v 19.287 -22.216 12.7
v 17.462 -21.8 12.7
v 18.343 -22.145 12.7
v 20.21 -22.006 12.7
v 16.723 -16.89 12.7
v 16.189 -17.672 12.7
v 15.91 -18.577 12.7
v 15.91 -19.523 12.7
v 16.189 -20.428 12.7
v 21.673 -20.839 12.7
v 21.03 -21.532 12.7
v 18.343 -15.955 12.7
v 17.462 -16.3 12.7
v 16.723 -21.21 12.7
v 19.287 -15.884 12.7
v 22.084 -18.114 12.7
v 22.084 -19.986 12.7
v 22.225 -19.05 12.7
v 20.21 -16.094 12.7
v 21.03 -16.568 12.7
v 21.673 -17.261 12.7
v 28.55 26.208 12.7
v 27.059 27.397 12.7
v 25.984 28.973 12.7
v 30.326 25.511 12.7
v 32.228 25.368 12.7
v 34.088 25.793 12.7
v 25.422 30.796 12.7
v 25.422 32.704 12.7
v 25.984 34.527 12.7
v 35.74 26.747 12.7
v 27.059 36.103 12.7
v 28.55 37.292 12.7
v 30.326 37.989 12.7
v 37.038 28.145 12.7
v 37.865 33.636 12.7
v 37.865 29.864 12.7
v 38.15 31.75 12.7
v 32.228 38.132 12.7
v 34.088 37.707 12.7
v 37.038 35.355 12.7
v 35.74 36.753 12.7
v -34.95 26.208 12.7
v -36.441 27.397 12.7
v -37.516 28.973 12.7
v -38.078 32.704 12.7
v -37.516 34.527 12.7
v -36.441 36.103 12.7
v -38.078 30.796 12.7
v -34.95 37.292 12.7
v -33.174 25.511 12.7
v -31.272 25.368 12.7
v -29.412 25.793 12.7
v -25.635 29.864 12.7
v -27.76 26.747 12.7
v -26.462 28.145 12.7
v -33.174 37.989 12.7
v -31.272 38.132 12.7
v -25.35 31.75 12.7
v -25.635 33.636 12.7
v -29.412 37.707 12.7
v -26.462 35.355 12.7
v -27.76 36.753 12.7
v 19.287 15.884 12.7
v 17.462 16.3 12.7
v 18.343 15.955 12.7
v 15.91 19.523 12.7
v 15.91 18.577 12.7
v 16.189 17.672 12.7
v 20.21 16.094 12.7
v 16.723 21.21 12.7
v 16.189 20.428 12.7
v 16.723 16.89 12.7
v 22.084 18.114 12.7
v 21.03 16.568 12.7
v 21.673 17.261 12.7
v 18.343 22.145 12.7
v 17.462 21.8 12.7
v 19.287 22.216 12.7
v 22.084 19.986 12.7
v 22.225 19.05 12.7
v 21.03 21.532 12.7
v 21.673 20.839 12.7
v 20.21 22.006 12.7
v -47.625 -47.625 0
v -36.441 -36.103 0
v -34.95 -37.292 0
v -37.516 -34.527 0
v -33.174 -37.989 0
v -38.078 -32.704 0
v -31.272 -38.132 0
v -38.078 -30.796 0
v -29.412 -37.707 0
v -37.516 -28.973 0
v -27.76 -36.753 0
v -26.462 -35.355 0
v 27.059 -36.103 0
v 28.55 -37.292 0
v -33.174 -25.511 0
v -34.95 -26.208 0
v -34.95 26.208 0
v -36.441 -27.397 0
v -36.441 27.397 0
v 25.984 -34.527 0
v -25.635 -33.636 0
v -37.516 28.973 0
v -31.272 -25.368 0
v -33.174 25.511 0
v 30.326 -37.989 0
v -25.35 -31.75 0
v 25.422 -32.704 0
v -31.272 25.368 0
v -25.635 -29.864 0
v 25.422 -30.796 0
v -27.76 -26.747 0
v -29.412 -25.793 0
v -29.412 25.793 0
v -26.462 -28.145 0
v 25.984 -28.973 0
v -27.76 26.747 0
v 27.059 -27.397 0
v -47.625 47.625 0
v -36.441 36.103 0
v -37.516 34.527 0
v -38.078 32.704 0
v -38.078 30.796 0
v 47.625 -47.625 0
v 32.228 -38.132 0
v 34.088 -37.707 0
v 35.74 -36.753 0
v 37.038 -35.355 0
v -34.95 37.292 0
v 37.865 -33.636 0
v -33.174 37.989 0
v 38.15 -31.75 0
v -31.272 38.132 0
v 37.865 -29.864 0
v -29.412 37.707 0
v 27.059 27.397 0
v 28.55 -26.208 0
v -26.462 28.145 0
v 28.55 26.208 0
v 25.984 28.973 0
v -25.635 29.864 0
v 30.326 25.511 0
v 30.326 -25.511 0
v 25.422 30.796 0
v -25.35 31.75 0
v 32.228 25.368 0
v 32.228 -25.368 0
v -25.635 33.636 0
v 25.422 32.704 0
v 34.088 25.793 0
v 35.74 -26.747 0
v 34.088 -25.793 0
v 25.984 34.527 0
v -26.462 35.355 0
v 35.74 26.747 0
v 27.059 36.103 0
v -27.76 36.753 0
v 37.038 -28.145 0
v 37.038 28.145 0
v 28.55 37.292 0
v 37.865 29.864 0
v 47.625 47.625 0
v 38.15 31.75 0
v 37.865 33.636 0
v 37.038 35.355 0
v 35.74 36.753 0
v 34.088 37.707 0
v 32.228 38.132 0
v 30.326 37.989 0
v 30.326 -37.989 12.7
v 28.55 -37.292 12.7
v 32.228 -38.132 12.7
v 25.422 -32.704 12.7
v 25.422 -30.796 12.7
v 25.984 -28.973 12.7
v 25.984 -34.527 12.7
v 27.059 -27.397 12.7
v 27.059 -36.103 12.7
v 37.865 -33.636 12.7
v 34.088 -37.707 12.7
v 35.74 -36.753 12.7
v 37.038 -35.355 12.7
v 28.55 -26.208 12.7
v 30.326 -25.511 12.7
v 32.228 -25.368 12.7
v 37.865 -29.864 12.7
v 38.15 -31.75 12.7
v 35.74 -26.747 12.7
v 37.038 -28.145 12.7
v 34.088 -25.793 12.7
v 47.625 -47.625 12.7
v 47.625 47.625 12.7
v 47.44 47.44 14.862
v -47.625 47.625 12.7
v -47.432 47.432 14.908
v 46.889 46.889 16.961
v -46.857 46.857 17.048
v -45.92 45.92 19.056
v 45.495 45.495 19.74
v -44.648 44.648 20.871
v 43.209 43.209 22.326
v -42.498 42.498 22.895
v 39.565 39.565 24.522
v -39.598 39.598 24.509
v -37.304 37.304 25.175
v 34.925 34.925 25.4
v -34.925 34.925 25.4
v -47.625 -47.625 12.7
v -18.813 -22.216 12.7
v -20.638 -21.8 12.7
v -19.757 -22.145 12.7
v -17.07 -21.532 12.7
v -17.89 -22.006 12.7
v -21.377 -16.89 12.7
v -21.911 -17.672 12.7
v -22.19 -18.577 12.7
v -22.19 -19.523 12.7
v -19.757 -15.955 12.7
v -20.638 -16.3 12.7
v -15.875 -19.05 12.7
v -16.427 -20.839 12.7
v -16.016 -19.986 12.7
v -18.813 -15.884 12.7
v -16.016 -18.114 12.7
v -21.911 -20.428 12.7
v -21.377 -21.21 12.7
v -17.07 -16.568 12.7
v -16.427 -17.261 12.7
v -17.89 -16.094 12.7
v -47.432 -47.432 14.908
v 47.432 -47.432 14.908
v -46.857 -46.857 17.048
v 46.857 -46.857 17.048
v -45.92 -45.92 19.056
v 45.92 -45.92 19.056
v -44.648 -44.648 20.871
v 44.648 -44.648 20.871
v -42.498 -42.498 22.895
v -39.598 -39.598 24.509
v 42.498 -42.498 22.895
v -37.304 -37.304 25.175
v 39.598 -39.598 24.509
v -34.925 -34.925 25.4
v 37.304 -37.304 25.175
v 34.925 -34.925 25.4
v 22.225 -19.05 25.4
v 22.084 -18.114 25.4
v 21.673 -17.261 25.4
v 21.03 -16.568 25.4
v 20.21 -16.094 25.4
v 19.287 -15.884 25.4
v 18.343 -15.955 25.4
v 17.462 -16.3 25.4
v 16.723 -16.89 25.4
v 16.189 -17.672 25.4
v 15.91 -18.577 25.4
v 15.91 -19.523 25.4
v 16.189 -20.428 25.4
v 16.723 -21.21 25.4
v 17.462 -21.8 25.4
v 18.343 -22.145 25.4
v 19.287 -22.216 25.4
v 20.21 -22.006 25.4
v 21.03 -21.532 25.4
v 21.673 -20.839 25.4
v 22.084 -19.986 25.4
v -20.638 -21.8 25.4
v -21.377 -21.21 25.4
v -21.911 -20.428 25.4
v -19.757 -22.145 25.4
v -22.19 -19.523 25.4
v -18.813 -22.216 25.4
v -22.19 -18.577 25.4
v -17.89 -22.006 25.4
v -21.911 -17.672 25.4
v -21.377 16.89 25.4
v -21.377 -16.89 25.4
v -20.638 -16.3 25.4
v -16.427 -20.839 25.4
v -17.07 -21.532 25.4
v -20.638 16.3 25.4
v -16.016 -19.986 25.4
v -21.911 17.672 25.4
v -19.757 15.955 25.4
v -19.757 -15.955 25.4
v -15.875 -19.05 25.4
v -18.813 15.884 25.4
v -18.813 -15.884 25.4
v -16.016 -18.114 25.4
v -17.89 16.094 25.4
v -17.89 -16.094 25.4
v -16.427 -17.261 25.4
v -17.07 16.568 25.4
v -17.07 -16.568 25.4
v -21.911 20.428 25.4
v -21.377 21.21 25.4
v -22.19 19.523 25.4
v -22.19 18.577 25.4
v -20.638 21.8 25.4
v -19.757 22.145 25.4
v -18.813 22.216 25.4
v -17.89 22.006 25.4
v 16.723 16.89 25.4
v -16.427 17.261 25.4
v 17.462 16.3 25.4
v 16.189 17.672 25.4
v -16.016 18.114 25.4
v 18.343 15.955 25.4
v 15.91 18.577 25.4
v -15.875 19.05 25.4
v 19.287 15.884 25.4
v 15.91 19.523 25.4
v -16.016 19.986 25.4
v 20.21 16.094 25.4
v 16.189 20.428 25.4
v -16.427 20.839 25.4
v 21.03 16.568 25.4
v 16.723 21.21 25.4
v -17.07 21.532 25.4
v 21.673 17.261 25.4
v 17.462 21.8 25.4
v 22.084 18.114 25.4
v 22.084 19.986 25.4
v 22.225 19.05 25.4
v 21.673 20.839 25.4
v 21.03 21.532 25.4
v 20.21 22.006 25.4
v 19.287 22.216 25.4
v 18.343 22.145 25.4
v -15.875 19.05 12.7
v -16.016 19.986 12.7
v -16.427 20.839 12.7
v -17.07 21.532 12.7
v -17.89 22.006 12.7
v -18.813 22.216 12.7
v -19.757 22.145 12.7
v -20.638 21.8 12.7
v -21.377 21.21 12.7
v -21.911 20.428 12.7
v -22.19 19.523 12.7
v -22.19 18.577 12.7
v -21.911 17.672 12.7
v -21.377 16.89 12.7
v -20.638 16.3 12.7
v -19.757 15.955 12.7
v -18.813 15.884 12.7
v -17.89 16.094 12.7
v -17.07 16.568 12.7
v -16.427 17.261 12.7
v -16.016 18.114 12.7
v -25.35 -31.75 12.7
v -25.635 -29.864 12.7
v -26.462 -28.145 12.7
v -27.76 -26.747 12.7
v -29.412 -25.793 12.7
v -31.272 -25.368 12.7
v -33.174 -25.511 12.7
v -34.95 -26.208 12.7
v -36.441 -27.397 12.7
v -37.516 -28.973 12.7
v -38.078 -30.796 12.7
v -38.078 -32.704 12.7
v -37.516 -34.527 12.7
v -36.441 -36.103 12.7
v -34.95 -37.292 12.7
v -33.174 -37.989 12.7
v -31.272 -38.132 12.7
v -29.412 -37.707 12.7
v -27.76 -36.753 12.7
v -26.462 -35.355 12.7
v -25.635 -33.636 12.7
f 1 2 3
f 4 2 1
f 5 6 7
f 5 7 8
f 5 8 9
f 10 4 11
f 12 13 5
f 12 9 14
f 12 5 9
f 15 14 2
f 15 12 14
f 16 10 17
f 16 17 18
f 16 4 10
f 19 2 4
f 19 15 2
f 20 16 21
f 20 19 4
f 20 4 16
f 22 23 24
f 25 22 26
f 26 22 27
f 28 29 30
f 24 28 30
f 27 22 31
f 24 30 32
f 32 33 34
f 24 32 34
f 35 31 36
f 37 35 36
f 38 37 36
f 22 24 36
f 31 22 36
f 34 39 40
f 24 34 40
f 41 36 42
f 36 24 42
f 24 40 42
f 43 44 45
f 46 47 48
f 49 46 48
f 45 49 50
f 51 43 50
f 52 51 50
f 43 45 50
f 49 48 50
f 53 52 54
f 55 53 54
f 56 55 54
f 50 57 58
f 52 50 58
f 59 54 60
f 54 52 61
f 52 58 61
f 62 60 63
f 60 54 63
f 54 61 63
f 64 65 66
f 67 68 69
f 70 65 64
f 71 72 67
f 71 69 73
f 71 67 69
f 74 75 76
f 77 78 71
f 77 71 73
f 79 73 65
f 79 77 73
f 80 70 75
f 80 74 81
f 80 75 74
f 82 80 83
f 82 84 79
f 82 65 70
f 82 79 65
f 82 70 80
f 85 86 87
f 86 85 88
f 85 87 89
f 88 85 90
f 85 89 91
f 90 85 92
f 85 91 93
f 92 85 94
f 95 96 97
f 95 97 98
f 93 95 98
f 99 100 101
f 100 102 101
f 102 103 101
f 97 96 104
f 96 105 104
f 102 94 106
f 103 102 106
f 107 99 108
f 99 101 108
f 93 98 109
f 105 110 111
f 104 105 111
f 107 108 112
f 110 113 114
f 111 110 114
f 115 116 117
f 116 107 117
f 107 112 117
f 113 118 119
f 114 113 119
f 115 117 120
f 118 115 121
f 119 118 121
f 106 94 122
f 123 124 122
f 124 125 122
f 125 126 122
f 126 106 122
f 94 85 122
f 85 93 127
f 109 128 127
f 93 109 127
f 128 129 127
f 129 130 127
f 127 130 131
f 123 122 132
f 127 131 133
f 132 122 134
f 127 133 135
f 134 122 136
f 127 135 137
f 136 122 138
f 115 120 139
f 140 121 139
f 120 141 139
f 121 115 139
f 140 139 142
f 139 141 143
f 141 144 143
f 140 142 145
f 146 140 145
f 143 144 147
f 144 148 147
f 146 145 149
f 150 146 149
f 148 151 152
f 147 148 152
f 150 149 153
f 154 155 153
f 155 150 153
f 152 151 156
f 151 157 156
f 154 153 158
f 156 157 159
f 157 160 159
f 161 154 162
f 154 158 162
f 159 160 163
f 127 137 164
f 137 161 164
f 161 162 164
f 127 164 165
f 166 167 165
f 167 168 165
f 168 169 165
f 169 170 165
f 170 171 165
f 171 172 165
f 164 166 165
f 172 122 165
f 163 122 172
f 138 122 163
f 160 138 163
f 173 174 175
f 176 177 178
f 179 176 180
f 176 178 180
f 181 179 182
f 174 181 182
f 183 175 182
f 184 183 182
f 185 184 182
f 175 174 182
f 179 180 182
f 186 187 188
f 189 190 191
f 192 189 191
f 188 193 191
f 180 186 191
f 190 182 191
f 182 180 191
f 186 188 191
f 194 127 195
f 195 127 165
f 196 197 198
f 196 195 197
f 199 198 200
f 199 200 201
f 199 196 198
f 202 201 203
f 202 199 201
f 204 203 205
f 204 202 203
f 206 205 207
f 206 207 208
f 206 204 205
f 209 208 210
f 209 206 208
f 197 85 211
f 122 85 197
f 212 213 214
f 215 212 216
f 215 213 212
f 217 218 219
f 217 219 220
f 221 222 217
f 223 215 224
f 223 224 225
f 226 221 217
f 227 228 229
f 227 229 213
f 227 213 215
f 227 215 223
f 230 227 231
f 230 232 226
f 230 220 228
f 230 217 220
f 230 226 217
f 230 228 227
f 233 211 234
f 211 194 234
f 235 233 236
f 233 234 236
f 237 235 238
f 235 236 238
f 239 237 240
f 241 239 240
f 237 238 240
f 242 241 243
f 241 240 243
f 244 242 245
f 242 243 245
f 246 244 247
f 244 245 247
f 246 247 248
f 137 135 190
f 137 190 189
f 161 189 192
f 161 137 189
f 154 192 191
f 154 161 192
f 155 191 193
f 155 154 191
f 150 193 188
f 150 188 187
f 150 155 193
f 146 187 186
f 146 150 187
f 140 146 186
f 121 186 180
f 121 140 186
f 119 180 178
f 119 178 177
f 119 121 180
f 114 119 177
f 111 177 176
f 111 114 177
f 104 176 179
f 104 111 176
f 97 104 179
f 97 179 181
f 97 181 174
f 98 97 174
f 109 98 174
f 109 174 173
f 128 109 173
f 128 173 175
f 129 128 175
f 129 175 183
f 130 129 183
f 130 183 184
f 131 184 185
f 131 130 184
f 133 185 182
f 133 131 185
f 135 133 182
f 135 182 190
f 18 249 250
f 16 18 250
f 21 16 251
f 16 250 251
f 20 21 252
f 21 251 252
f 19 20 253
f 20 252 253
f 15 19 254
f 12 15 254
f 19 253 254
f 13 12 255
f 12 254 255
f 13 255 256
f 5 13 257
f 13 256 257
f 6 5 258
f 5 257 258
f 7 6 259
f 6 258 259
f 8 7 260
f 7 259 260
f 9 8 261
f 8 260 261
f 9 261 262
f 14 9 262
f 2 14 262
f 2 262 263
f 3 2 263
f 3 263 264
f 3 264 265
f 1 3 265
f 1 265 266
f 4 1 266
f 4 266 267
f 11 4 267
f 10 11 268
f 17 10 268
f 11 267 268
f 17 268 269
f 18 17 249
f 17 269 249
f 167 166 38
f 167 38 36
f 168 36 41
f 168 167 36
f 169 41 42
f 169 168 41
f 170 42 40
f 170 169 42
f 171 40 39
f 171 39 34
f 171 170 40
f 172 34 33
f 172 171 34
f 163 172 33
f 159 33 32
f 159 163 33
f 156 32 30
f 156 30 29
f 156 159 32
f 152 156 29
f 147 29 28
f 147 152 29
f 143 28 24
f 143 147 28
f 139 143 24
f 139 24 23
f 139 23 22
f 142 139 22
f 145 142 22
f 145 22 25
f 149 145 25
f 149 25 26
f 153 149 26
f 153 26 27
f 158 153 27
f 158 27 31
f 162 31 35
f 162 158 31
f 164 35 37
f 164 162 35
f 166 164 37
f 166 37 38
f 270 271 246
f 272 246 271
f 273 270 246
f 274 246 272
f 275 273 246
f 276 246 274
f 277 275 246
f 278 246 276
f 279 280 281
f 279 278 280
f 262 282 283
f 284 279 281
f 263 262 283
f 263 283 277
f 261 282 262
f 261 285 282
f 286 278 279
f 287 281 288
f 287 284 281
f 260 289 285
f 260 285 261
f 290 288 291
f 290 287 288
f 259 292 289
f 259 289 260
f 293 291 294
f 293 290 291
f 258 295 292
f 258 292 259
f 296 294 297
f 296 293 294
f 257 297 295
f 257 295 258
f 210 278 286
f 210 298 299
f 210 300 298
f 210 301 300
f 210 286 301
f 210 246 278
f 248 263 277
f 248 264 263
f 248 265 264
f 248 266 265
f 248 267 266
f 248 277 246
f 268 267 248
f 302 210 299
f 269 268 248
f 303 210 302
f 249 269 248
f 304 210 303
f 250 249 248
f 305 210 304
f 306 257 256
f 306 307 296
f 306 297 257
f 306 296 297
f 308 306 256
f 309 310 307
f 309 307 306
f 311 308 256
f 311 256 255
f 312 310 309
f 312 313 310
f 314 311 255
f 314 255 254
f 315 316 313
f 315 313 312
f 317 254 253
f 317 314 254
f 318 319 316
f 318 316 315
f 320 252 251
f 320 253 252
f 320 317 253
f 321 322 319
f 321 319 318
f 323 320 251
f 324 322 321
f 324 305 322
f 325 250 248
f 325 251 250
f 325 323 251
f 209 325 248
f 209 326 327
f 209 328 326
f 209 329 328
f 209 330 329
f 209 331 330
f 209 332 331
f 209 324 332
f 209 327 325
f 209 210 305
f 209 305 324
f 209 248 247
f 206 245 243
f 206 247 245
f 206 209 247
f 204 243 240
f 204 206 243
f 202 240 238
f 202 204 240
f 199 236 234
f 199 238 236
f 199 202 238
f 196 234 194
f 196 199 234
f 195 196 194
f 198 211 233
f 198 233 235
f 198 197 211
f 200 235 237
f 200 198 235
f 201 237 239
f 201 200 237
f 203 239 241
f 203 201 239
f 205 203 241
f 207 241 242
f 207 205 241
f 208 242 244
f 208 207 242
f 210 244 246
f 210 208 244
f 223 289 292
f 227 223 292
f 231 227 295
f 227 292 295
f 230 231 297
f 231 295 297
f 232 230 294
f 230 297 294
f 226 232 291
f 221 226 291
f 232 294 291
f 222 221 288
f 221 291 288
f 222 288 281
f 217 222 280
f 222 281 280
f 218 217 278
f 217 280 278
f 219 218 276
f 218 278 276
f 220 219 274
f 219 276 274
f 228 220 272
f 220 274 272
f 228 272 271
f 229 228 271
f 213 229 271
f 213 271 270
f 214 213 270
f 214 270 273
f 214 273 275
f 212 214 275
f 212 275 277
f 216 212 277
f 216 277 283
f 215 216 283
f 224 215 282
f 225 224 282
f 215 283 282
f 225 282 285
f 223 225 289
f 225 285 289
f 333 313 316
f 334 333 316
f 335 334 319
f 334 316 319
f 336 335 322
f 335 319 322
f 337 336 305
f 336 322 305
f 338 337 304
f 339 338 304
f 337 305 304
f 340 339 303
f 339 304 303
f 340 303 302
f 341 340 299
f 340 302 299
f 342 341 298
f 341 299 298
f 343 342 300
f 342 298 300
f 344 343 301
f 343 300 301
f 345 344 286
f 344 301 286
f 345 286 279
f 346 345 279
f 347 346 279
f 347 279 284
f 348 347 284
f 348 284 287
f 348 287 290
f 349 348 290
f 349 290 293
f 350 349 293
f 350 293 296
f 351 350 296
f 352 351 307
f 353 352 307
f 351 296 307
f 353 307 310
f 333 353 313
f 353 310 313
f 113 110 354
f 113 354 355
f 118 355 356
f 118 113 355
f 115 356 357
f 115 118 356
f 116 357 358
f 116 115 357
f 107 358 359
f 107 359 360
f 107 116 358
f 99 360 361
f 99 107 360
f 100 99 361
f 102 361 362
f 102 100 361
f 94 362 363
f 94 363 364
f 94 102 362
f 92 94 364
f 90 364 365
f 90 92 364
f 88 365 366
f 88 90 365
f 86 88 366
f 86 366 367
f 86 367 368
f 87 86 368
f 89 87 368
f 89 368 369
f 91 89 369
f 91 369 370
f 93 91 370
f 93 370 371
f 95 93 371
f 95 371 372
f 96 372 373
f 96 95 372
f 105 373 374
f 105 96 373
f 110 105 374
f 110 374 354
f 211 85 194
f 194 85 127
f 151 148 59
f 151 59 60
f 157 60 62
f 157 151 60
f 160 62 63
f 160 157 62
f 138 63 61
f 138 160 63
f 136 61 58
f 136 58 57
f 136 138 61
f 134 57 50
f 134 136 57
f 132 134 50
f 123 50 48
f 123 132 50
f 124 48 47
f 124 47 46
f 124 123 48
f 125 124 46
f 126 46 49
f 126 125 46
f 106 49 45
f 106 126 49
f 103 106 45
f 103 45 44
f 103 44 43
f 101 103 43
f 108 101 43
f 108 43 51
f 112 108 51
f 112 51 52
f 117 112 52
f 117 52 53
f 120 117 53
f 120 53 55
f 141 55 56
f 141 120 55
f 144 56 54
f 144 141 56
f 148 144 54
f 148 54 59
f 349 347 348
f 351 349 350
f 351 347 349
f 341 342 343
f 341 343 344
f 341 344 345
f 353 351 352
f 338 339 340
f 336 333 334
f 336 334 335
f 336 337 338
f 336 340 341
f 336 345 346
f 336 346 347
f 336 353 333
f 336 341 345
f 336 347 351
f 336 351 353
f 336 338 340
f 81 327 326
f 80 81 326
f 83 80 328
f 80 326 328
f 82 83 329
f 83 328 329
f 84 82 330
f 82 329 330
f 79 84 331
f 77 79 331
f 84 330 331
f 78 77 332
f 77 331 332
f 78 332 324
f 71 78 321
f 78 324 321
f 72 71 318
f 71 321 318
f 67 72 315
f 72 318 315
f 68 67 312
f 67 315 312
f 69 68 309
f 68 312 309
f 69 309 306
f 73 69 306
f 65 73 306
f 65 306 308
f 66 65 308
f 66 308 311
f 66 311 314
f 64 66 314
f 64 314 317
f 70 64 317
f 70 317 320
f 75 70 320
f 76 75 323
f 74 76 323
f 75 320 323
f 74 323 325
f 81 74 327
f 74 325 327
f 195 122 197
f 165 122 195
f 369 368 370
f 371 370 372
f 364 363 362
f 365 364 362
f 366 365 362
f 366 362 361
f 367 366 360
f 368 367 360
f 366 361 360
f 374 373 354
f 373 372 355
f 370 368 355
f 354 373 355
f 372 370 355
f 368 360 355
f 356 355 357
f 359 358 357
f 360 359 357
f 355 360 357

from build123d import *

# Parameters (mm, degrees)
F0_W     = 95.25
F0_H     = 95.25
F2_DEPTH = 25.4
F1_R     = 6.399699
F3_DEPTH = 12.7
F4_R     = 3.175
F5_DEPTH = 12.7
F6_R     = 12.7


with BuildPart() as f2:
    # F0 (on Top) → F2 (new body)
    with BuildSketch(Plane.XY):
        Rectangle(F0_W, F0_H)
    extrude(amount=F2_DEPTH)

    # F1 (on Top) → F3 (cut)
    with BuildSketch(Plane.XY):
        with Locations((-31.75, 31.75)):
            Circle(F1_R)
        with Locations((31.75, 31.75)):
            Circle(F1_R)
        with Locations((31.75, -31.75)):
            Circle(F1_R)
        with Locations((-31.75, -31.75)):
            Circle(F1_R)
    extrude(amount=F3_DEPTH, mode=Mode.SUBTRACT)

    # F4 (on face) → F5 (cut)
    with BuildSketch(Plane.XY.offset(25.4)):
        with Locations((-19.05, -19.05)):
            Circle(F4_R)
        with Locations((19.05, -19.05)):
            Circle(F4_R)
        with Locations((19.05, 19.05)):
            Circle(F4_R)
        with Locations((-19.05, 19.05)):
            Circle(F4_R)
    extrude(amount=-F5_DEPTH, mode=Mode.SUBTRACT)

    # F6
    f6_edges = [f2.edges().sort_by_distance(p)[0] for p in [
        (-47.625, 0, 25.4),
        (0, -47.625, 25.4),
        (47.625, 0, 25.4),
        (0, 47.625, 25.4),
    ]]
    fillet(f6_edges, radius=F6_R)


solid = f2.part
